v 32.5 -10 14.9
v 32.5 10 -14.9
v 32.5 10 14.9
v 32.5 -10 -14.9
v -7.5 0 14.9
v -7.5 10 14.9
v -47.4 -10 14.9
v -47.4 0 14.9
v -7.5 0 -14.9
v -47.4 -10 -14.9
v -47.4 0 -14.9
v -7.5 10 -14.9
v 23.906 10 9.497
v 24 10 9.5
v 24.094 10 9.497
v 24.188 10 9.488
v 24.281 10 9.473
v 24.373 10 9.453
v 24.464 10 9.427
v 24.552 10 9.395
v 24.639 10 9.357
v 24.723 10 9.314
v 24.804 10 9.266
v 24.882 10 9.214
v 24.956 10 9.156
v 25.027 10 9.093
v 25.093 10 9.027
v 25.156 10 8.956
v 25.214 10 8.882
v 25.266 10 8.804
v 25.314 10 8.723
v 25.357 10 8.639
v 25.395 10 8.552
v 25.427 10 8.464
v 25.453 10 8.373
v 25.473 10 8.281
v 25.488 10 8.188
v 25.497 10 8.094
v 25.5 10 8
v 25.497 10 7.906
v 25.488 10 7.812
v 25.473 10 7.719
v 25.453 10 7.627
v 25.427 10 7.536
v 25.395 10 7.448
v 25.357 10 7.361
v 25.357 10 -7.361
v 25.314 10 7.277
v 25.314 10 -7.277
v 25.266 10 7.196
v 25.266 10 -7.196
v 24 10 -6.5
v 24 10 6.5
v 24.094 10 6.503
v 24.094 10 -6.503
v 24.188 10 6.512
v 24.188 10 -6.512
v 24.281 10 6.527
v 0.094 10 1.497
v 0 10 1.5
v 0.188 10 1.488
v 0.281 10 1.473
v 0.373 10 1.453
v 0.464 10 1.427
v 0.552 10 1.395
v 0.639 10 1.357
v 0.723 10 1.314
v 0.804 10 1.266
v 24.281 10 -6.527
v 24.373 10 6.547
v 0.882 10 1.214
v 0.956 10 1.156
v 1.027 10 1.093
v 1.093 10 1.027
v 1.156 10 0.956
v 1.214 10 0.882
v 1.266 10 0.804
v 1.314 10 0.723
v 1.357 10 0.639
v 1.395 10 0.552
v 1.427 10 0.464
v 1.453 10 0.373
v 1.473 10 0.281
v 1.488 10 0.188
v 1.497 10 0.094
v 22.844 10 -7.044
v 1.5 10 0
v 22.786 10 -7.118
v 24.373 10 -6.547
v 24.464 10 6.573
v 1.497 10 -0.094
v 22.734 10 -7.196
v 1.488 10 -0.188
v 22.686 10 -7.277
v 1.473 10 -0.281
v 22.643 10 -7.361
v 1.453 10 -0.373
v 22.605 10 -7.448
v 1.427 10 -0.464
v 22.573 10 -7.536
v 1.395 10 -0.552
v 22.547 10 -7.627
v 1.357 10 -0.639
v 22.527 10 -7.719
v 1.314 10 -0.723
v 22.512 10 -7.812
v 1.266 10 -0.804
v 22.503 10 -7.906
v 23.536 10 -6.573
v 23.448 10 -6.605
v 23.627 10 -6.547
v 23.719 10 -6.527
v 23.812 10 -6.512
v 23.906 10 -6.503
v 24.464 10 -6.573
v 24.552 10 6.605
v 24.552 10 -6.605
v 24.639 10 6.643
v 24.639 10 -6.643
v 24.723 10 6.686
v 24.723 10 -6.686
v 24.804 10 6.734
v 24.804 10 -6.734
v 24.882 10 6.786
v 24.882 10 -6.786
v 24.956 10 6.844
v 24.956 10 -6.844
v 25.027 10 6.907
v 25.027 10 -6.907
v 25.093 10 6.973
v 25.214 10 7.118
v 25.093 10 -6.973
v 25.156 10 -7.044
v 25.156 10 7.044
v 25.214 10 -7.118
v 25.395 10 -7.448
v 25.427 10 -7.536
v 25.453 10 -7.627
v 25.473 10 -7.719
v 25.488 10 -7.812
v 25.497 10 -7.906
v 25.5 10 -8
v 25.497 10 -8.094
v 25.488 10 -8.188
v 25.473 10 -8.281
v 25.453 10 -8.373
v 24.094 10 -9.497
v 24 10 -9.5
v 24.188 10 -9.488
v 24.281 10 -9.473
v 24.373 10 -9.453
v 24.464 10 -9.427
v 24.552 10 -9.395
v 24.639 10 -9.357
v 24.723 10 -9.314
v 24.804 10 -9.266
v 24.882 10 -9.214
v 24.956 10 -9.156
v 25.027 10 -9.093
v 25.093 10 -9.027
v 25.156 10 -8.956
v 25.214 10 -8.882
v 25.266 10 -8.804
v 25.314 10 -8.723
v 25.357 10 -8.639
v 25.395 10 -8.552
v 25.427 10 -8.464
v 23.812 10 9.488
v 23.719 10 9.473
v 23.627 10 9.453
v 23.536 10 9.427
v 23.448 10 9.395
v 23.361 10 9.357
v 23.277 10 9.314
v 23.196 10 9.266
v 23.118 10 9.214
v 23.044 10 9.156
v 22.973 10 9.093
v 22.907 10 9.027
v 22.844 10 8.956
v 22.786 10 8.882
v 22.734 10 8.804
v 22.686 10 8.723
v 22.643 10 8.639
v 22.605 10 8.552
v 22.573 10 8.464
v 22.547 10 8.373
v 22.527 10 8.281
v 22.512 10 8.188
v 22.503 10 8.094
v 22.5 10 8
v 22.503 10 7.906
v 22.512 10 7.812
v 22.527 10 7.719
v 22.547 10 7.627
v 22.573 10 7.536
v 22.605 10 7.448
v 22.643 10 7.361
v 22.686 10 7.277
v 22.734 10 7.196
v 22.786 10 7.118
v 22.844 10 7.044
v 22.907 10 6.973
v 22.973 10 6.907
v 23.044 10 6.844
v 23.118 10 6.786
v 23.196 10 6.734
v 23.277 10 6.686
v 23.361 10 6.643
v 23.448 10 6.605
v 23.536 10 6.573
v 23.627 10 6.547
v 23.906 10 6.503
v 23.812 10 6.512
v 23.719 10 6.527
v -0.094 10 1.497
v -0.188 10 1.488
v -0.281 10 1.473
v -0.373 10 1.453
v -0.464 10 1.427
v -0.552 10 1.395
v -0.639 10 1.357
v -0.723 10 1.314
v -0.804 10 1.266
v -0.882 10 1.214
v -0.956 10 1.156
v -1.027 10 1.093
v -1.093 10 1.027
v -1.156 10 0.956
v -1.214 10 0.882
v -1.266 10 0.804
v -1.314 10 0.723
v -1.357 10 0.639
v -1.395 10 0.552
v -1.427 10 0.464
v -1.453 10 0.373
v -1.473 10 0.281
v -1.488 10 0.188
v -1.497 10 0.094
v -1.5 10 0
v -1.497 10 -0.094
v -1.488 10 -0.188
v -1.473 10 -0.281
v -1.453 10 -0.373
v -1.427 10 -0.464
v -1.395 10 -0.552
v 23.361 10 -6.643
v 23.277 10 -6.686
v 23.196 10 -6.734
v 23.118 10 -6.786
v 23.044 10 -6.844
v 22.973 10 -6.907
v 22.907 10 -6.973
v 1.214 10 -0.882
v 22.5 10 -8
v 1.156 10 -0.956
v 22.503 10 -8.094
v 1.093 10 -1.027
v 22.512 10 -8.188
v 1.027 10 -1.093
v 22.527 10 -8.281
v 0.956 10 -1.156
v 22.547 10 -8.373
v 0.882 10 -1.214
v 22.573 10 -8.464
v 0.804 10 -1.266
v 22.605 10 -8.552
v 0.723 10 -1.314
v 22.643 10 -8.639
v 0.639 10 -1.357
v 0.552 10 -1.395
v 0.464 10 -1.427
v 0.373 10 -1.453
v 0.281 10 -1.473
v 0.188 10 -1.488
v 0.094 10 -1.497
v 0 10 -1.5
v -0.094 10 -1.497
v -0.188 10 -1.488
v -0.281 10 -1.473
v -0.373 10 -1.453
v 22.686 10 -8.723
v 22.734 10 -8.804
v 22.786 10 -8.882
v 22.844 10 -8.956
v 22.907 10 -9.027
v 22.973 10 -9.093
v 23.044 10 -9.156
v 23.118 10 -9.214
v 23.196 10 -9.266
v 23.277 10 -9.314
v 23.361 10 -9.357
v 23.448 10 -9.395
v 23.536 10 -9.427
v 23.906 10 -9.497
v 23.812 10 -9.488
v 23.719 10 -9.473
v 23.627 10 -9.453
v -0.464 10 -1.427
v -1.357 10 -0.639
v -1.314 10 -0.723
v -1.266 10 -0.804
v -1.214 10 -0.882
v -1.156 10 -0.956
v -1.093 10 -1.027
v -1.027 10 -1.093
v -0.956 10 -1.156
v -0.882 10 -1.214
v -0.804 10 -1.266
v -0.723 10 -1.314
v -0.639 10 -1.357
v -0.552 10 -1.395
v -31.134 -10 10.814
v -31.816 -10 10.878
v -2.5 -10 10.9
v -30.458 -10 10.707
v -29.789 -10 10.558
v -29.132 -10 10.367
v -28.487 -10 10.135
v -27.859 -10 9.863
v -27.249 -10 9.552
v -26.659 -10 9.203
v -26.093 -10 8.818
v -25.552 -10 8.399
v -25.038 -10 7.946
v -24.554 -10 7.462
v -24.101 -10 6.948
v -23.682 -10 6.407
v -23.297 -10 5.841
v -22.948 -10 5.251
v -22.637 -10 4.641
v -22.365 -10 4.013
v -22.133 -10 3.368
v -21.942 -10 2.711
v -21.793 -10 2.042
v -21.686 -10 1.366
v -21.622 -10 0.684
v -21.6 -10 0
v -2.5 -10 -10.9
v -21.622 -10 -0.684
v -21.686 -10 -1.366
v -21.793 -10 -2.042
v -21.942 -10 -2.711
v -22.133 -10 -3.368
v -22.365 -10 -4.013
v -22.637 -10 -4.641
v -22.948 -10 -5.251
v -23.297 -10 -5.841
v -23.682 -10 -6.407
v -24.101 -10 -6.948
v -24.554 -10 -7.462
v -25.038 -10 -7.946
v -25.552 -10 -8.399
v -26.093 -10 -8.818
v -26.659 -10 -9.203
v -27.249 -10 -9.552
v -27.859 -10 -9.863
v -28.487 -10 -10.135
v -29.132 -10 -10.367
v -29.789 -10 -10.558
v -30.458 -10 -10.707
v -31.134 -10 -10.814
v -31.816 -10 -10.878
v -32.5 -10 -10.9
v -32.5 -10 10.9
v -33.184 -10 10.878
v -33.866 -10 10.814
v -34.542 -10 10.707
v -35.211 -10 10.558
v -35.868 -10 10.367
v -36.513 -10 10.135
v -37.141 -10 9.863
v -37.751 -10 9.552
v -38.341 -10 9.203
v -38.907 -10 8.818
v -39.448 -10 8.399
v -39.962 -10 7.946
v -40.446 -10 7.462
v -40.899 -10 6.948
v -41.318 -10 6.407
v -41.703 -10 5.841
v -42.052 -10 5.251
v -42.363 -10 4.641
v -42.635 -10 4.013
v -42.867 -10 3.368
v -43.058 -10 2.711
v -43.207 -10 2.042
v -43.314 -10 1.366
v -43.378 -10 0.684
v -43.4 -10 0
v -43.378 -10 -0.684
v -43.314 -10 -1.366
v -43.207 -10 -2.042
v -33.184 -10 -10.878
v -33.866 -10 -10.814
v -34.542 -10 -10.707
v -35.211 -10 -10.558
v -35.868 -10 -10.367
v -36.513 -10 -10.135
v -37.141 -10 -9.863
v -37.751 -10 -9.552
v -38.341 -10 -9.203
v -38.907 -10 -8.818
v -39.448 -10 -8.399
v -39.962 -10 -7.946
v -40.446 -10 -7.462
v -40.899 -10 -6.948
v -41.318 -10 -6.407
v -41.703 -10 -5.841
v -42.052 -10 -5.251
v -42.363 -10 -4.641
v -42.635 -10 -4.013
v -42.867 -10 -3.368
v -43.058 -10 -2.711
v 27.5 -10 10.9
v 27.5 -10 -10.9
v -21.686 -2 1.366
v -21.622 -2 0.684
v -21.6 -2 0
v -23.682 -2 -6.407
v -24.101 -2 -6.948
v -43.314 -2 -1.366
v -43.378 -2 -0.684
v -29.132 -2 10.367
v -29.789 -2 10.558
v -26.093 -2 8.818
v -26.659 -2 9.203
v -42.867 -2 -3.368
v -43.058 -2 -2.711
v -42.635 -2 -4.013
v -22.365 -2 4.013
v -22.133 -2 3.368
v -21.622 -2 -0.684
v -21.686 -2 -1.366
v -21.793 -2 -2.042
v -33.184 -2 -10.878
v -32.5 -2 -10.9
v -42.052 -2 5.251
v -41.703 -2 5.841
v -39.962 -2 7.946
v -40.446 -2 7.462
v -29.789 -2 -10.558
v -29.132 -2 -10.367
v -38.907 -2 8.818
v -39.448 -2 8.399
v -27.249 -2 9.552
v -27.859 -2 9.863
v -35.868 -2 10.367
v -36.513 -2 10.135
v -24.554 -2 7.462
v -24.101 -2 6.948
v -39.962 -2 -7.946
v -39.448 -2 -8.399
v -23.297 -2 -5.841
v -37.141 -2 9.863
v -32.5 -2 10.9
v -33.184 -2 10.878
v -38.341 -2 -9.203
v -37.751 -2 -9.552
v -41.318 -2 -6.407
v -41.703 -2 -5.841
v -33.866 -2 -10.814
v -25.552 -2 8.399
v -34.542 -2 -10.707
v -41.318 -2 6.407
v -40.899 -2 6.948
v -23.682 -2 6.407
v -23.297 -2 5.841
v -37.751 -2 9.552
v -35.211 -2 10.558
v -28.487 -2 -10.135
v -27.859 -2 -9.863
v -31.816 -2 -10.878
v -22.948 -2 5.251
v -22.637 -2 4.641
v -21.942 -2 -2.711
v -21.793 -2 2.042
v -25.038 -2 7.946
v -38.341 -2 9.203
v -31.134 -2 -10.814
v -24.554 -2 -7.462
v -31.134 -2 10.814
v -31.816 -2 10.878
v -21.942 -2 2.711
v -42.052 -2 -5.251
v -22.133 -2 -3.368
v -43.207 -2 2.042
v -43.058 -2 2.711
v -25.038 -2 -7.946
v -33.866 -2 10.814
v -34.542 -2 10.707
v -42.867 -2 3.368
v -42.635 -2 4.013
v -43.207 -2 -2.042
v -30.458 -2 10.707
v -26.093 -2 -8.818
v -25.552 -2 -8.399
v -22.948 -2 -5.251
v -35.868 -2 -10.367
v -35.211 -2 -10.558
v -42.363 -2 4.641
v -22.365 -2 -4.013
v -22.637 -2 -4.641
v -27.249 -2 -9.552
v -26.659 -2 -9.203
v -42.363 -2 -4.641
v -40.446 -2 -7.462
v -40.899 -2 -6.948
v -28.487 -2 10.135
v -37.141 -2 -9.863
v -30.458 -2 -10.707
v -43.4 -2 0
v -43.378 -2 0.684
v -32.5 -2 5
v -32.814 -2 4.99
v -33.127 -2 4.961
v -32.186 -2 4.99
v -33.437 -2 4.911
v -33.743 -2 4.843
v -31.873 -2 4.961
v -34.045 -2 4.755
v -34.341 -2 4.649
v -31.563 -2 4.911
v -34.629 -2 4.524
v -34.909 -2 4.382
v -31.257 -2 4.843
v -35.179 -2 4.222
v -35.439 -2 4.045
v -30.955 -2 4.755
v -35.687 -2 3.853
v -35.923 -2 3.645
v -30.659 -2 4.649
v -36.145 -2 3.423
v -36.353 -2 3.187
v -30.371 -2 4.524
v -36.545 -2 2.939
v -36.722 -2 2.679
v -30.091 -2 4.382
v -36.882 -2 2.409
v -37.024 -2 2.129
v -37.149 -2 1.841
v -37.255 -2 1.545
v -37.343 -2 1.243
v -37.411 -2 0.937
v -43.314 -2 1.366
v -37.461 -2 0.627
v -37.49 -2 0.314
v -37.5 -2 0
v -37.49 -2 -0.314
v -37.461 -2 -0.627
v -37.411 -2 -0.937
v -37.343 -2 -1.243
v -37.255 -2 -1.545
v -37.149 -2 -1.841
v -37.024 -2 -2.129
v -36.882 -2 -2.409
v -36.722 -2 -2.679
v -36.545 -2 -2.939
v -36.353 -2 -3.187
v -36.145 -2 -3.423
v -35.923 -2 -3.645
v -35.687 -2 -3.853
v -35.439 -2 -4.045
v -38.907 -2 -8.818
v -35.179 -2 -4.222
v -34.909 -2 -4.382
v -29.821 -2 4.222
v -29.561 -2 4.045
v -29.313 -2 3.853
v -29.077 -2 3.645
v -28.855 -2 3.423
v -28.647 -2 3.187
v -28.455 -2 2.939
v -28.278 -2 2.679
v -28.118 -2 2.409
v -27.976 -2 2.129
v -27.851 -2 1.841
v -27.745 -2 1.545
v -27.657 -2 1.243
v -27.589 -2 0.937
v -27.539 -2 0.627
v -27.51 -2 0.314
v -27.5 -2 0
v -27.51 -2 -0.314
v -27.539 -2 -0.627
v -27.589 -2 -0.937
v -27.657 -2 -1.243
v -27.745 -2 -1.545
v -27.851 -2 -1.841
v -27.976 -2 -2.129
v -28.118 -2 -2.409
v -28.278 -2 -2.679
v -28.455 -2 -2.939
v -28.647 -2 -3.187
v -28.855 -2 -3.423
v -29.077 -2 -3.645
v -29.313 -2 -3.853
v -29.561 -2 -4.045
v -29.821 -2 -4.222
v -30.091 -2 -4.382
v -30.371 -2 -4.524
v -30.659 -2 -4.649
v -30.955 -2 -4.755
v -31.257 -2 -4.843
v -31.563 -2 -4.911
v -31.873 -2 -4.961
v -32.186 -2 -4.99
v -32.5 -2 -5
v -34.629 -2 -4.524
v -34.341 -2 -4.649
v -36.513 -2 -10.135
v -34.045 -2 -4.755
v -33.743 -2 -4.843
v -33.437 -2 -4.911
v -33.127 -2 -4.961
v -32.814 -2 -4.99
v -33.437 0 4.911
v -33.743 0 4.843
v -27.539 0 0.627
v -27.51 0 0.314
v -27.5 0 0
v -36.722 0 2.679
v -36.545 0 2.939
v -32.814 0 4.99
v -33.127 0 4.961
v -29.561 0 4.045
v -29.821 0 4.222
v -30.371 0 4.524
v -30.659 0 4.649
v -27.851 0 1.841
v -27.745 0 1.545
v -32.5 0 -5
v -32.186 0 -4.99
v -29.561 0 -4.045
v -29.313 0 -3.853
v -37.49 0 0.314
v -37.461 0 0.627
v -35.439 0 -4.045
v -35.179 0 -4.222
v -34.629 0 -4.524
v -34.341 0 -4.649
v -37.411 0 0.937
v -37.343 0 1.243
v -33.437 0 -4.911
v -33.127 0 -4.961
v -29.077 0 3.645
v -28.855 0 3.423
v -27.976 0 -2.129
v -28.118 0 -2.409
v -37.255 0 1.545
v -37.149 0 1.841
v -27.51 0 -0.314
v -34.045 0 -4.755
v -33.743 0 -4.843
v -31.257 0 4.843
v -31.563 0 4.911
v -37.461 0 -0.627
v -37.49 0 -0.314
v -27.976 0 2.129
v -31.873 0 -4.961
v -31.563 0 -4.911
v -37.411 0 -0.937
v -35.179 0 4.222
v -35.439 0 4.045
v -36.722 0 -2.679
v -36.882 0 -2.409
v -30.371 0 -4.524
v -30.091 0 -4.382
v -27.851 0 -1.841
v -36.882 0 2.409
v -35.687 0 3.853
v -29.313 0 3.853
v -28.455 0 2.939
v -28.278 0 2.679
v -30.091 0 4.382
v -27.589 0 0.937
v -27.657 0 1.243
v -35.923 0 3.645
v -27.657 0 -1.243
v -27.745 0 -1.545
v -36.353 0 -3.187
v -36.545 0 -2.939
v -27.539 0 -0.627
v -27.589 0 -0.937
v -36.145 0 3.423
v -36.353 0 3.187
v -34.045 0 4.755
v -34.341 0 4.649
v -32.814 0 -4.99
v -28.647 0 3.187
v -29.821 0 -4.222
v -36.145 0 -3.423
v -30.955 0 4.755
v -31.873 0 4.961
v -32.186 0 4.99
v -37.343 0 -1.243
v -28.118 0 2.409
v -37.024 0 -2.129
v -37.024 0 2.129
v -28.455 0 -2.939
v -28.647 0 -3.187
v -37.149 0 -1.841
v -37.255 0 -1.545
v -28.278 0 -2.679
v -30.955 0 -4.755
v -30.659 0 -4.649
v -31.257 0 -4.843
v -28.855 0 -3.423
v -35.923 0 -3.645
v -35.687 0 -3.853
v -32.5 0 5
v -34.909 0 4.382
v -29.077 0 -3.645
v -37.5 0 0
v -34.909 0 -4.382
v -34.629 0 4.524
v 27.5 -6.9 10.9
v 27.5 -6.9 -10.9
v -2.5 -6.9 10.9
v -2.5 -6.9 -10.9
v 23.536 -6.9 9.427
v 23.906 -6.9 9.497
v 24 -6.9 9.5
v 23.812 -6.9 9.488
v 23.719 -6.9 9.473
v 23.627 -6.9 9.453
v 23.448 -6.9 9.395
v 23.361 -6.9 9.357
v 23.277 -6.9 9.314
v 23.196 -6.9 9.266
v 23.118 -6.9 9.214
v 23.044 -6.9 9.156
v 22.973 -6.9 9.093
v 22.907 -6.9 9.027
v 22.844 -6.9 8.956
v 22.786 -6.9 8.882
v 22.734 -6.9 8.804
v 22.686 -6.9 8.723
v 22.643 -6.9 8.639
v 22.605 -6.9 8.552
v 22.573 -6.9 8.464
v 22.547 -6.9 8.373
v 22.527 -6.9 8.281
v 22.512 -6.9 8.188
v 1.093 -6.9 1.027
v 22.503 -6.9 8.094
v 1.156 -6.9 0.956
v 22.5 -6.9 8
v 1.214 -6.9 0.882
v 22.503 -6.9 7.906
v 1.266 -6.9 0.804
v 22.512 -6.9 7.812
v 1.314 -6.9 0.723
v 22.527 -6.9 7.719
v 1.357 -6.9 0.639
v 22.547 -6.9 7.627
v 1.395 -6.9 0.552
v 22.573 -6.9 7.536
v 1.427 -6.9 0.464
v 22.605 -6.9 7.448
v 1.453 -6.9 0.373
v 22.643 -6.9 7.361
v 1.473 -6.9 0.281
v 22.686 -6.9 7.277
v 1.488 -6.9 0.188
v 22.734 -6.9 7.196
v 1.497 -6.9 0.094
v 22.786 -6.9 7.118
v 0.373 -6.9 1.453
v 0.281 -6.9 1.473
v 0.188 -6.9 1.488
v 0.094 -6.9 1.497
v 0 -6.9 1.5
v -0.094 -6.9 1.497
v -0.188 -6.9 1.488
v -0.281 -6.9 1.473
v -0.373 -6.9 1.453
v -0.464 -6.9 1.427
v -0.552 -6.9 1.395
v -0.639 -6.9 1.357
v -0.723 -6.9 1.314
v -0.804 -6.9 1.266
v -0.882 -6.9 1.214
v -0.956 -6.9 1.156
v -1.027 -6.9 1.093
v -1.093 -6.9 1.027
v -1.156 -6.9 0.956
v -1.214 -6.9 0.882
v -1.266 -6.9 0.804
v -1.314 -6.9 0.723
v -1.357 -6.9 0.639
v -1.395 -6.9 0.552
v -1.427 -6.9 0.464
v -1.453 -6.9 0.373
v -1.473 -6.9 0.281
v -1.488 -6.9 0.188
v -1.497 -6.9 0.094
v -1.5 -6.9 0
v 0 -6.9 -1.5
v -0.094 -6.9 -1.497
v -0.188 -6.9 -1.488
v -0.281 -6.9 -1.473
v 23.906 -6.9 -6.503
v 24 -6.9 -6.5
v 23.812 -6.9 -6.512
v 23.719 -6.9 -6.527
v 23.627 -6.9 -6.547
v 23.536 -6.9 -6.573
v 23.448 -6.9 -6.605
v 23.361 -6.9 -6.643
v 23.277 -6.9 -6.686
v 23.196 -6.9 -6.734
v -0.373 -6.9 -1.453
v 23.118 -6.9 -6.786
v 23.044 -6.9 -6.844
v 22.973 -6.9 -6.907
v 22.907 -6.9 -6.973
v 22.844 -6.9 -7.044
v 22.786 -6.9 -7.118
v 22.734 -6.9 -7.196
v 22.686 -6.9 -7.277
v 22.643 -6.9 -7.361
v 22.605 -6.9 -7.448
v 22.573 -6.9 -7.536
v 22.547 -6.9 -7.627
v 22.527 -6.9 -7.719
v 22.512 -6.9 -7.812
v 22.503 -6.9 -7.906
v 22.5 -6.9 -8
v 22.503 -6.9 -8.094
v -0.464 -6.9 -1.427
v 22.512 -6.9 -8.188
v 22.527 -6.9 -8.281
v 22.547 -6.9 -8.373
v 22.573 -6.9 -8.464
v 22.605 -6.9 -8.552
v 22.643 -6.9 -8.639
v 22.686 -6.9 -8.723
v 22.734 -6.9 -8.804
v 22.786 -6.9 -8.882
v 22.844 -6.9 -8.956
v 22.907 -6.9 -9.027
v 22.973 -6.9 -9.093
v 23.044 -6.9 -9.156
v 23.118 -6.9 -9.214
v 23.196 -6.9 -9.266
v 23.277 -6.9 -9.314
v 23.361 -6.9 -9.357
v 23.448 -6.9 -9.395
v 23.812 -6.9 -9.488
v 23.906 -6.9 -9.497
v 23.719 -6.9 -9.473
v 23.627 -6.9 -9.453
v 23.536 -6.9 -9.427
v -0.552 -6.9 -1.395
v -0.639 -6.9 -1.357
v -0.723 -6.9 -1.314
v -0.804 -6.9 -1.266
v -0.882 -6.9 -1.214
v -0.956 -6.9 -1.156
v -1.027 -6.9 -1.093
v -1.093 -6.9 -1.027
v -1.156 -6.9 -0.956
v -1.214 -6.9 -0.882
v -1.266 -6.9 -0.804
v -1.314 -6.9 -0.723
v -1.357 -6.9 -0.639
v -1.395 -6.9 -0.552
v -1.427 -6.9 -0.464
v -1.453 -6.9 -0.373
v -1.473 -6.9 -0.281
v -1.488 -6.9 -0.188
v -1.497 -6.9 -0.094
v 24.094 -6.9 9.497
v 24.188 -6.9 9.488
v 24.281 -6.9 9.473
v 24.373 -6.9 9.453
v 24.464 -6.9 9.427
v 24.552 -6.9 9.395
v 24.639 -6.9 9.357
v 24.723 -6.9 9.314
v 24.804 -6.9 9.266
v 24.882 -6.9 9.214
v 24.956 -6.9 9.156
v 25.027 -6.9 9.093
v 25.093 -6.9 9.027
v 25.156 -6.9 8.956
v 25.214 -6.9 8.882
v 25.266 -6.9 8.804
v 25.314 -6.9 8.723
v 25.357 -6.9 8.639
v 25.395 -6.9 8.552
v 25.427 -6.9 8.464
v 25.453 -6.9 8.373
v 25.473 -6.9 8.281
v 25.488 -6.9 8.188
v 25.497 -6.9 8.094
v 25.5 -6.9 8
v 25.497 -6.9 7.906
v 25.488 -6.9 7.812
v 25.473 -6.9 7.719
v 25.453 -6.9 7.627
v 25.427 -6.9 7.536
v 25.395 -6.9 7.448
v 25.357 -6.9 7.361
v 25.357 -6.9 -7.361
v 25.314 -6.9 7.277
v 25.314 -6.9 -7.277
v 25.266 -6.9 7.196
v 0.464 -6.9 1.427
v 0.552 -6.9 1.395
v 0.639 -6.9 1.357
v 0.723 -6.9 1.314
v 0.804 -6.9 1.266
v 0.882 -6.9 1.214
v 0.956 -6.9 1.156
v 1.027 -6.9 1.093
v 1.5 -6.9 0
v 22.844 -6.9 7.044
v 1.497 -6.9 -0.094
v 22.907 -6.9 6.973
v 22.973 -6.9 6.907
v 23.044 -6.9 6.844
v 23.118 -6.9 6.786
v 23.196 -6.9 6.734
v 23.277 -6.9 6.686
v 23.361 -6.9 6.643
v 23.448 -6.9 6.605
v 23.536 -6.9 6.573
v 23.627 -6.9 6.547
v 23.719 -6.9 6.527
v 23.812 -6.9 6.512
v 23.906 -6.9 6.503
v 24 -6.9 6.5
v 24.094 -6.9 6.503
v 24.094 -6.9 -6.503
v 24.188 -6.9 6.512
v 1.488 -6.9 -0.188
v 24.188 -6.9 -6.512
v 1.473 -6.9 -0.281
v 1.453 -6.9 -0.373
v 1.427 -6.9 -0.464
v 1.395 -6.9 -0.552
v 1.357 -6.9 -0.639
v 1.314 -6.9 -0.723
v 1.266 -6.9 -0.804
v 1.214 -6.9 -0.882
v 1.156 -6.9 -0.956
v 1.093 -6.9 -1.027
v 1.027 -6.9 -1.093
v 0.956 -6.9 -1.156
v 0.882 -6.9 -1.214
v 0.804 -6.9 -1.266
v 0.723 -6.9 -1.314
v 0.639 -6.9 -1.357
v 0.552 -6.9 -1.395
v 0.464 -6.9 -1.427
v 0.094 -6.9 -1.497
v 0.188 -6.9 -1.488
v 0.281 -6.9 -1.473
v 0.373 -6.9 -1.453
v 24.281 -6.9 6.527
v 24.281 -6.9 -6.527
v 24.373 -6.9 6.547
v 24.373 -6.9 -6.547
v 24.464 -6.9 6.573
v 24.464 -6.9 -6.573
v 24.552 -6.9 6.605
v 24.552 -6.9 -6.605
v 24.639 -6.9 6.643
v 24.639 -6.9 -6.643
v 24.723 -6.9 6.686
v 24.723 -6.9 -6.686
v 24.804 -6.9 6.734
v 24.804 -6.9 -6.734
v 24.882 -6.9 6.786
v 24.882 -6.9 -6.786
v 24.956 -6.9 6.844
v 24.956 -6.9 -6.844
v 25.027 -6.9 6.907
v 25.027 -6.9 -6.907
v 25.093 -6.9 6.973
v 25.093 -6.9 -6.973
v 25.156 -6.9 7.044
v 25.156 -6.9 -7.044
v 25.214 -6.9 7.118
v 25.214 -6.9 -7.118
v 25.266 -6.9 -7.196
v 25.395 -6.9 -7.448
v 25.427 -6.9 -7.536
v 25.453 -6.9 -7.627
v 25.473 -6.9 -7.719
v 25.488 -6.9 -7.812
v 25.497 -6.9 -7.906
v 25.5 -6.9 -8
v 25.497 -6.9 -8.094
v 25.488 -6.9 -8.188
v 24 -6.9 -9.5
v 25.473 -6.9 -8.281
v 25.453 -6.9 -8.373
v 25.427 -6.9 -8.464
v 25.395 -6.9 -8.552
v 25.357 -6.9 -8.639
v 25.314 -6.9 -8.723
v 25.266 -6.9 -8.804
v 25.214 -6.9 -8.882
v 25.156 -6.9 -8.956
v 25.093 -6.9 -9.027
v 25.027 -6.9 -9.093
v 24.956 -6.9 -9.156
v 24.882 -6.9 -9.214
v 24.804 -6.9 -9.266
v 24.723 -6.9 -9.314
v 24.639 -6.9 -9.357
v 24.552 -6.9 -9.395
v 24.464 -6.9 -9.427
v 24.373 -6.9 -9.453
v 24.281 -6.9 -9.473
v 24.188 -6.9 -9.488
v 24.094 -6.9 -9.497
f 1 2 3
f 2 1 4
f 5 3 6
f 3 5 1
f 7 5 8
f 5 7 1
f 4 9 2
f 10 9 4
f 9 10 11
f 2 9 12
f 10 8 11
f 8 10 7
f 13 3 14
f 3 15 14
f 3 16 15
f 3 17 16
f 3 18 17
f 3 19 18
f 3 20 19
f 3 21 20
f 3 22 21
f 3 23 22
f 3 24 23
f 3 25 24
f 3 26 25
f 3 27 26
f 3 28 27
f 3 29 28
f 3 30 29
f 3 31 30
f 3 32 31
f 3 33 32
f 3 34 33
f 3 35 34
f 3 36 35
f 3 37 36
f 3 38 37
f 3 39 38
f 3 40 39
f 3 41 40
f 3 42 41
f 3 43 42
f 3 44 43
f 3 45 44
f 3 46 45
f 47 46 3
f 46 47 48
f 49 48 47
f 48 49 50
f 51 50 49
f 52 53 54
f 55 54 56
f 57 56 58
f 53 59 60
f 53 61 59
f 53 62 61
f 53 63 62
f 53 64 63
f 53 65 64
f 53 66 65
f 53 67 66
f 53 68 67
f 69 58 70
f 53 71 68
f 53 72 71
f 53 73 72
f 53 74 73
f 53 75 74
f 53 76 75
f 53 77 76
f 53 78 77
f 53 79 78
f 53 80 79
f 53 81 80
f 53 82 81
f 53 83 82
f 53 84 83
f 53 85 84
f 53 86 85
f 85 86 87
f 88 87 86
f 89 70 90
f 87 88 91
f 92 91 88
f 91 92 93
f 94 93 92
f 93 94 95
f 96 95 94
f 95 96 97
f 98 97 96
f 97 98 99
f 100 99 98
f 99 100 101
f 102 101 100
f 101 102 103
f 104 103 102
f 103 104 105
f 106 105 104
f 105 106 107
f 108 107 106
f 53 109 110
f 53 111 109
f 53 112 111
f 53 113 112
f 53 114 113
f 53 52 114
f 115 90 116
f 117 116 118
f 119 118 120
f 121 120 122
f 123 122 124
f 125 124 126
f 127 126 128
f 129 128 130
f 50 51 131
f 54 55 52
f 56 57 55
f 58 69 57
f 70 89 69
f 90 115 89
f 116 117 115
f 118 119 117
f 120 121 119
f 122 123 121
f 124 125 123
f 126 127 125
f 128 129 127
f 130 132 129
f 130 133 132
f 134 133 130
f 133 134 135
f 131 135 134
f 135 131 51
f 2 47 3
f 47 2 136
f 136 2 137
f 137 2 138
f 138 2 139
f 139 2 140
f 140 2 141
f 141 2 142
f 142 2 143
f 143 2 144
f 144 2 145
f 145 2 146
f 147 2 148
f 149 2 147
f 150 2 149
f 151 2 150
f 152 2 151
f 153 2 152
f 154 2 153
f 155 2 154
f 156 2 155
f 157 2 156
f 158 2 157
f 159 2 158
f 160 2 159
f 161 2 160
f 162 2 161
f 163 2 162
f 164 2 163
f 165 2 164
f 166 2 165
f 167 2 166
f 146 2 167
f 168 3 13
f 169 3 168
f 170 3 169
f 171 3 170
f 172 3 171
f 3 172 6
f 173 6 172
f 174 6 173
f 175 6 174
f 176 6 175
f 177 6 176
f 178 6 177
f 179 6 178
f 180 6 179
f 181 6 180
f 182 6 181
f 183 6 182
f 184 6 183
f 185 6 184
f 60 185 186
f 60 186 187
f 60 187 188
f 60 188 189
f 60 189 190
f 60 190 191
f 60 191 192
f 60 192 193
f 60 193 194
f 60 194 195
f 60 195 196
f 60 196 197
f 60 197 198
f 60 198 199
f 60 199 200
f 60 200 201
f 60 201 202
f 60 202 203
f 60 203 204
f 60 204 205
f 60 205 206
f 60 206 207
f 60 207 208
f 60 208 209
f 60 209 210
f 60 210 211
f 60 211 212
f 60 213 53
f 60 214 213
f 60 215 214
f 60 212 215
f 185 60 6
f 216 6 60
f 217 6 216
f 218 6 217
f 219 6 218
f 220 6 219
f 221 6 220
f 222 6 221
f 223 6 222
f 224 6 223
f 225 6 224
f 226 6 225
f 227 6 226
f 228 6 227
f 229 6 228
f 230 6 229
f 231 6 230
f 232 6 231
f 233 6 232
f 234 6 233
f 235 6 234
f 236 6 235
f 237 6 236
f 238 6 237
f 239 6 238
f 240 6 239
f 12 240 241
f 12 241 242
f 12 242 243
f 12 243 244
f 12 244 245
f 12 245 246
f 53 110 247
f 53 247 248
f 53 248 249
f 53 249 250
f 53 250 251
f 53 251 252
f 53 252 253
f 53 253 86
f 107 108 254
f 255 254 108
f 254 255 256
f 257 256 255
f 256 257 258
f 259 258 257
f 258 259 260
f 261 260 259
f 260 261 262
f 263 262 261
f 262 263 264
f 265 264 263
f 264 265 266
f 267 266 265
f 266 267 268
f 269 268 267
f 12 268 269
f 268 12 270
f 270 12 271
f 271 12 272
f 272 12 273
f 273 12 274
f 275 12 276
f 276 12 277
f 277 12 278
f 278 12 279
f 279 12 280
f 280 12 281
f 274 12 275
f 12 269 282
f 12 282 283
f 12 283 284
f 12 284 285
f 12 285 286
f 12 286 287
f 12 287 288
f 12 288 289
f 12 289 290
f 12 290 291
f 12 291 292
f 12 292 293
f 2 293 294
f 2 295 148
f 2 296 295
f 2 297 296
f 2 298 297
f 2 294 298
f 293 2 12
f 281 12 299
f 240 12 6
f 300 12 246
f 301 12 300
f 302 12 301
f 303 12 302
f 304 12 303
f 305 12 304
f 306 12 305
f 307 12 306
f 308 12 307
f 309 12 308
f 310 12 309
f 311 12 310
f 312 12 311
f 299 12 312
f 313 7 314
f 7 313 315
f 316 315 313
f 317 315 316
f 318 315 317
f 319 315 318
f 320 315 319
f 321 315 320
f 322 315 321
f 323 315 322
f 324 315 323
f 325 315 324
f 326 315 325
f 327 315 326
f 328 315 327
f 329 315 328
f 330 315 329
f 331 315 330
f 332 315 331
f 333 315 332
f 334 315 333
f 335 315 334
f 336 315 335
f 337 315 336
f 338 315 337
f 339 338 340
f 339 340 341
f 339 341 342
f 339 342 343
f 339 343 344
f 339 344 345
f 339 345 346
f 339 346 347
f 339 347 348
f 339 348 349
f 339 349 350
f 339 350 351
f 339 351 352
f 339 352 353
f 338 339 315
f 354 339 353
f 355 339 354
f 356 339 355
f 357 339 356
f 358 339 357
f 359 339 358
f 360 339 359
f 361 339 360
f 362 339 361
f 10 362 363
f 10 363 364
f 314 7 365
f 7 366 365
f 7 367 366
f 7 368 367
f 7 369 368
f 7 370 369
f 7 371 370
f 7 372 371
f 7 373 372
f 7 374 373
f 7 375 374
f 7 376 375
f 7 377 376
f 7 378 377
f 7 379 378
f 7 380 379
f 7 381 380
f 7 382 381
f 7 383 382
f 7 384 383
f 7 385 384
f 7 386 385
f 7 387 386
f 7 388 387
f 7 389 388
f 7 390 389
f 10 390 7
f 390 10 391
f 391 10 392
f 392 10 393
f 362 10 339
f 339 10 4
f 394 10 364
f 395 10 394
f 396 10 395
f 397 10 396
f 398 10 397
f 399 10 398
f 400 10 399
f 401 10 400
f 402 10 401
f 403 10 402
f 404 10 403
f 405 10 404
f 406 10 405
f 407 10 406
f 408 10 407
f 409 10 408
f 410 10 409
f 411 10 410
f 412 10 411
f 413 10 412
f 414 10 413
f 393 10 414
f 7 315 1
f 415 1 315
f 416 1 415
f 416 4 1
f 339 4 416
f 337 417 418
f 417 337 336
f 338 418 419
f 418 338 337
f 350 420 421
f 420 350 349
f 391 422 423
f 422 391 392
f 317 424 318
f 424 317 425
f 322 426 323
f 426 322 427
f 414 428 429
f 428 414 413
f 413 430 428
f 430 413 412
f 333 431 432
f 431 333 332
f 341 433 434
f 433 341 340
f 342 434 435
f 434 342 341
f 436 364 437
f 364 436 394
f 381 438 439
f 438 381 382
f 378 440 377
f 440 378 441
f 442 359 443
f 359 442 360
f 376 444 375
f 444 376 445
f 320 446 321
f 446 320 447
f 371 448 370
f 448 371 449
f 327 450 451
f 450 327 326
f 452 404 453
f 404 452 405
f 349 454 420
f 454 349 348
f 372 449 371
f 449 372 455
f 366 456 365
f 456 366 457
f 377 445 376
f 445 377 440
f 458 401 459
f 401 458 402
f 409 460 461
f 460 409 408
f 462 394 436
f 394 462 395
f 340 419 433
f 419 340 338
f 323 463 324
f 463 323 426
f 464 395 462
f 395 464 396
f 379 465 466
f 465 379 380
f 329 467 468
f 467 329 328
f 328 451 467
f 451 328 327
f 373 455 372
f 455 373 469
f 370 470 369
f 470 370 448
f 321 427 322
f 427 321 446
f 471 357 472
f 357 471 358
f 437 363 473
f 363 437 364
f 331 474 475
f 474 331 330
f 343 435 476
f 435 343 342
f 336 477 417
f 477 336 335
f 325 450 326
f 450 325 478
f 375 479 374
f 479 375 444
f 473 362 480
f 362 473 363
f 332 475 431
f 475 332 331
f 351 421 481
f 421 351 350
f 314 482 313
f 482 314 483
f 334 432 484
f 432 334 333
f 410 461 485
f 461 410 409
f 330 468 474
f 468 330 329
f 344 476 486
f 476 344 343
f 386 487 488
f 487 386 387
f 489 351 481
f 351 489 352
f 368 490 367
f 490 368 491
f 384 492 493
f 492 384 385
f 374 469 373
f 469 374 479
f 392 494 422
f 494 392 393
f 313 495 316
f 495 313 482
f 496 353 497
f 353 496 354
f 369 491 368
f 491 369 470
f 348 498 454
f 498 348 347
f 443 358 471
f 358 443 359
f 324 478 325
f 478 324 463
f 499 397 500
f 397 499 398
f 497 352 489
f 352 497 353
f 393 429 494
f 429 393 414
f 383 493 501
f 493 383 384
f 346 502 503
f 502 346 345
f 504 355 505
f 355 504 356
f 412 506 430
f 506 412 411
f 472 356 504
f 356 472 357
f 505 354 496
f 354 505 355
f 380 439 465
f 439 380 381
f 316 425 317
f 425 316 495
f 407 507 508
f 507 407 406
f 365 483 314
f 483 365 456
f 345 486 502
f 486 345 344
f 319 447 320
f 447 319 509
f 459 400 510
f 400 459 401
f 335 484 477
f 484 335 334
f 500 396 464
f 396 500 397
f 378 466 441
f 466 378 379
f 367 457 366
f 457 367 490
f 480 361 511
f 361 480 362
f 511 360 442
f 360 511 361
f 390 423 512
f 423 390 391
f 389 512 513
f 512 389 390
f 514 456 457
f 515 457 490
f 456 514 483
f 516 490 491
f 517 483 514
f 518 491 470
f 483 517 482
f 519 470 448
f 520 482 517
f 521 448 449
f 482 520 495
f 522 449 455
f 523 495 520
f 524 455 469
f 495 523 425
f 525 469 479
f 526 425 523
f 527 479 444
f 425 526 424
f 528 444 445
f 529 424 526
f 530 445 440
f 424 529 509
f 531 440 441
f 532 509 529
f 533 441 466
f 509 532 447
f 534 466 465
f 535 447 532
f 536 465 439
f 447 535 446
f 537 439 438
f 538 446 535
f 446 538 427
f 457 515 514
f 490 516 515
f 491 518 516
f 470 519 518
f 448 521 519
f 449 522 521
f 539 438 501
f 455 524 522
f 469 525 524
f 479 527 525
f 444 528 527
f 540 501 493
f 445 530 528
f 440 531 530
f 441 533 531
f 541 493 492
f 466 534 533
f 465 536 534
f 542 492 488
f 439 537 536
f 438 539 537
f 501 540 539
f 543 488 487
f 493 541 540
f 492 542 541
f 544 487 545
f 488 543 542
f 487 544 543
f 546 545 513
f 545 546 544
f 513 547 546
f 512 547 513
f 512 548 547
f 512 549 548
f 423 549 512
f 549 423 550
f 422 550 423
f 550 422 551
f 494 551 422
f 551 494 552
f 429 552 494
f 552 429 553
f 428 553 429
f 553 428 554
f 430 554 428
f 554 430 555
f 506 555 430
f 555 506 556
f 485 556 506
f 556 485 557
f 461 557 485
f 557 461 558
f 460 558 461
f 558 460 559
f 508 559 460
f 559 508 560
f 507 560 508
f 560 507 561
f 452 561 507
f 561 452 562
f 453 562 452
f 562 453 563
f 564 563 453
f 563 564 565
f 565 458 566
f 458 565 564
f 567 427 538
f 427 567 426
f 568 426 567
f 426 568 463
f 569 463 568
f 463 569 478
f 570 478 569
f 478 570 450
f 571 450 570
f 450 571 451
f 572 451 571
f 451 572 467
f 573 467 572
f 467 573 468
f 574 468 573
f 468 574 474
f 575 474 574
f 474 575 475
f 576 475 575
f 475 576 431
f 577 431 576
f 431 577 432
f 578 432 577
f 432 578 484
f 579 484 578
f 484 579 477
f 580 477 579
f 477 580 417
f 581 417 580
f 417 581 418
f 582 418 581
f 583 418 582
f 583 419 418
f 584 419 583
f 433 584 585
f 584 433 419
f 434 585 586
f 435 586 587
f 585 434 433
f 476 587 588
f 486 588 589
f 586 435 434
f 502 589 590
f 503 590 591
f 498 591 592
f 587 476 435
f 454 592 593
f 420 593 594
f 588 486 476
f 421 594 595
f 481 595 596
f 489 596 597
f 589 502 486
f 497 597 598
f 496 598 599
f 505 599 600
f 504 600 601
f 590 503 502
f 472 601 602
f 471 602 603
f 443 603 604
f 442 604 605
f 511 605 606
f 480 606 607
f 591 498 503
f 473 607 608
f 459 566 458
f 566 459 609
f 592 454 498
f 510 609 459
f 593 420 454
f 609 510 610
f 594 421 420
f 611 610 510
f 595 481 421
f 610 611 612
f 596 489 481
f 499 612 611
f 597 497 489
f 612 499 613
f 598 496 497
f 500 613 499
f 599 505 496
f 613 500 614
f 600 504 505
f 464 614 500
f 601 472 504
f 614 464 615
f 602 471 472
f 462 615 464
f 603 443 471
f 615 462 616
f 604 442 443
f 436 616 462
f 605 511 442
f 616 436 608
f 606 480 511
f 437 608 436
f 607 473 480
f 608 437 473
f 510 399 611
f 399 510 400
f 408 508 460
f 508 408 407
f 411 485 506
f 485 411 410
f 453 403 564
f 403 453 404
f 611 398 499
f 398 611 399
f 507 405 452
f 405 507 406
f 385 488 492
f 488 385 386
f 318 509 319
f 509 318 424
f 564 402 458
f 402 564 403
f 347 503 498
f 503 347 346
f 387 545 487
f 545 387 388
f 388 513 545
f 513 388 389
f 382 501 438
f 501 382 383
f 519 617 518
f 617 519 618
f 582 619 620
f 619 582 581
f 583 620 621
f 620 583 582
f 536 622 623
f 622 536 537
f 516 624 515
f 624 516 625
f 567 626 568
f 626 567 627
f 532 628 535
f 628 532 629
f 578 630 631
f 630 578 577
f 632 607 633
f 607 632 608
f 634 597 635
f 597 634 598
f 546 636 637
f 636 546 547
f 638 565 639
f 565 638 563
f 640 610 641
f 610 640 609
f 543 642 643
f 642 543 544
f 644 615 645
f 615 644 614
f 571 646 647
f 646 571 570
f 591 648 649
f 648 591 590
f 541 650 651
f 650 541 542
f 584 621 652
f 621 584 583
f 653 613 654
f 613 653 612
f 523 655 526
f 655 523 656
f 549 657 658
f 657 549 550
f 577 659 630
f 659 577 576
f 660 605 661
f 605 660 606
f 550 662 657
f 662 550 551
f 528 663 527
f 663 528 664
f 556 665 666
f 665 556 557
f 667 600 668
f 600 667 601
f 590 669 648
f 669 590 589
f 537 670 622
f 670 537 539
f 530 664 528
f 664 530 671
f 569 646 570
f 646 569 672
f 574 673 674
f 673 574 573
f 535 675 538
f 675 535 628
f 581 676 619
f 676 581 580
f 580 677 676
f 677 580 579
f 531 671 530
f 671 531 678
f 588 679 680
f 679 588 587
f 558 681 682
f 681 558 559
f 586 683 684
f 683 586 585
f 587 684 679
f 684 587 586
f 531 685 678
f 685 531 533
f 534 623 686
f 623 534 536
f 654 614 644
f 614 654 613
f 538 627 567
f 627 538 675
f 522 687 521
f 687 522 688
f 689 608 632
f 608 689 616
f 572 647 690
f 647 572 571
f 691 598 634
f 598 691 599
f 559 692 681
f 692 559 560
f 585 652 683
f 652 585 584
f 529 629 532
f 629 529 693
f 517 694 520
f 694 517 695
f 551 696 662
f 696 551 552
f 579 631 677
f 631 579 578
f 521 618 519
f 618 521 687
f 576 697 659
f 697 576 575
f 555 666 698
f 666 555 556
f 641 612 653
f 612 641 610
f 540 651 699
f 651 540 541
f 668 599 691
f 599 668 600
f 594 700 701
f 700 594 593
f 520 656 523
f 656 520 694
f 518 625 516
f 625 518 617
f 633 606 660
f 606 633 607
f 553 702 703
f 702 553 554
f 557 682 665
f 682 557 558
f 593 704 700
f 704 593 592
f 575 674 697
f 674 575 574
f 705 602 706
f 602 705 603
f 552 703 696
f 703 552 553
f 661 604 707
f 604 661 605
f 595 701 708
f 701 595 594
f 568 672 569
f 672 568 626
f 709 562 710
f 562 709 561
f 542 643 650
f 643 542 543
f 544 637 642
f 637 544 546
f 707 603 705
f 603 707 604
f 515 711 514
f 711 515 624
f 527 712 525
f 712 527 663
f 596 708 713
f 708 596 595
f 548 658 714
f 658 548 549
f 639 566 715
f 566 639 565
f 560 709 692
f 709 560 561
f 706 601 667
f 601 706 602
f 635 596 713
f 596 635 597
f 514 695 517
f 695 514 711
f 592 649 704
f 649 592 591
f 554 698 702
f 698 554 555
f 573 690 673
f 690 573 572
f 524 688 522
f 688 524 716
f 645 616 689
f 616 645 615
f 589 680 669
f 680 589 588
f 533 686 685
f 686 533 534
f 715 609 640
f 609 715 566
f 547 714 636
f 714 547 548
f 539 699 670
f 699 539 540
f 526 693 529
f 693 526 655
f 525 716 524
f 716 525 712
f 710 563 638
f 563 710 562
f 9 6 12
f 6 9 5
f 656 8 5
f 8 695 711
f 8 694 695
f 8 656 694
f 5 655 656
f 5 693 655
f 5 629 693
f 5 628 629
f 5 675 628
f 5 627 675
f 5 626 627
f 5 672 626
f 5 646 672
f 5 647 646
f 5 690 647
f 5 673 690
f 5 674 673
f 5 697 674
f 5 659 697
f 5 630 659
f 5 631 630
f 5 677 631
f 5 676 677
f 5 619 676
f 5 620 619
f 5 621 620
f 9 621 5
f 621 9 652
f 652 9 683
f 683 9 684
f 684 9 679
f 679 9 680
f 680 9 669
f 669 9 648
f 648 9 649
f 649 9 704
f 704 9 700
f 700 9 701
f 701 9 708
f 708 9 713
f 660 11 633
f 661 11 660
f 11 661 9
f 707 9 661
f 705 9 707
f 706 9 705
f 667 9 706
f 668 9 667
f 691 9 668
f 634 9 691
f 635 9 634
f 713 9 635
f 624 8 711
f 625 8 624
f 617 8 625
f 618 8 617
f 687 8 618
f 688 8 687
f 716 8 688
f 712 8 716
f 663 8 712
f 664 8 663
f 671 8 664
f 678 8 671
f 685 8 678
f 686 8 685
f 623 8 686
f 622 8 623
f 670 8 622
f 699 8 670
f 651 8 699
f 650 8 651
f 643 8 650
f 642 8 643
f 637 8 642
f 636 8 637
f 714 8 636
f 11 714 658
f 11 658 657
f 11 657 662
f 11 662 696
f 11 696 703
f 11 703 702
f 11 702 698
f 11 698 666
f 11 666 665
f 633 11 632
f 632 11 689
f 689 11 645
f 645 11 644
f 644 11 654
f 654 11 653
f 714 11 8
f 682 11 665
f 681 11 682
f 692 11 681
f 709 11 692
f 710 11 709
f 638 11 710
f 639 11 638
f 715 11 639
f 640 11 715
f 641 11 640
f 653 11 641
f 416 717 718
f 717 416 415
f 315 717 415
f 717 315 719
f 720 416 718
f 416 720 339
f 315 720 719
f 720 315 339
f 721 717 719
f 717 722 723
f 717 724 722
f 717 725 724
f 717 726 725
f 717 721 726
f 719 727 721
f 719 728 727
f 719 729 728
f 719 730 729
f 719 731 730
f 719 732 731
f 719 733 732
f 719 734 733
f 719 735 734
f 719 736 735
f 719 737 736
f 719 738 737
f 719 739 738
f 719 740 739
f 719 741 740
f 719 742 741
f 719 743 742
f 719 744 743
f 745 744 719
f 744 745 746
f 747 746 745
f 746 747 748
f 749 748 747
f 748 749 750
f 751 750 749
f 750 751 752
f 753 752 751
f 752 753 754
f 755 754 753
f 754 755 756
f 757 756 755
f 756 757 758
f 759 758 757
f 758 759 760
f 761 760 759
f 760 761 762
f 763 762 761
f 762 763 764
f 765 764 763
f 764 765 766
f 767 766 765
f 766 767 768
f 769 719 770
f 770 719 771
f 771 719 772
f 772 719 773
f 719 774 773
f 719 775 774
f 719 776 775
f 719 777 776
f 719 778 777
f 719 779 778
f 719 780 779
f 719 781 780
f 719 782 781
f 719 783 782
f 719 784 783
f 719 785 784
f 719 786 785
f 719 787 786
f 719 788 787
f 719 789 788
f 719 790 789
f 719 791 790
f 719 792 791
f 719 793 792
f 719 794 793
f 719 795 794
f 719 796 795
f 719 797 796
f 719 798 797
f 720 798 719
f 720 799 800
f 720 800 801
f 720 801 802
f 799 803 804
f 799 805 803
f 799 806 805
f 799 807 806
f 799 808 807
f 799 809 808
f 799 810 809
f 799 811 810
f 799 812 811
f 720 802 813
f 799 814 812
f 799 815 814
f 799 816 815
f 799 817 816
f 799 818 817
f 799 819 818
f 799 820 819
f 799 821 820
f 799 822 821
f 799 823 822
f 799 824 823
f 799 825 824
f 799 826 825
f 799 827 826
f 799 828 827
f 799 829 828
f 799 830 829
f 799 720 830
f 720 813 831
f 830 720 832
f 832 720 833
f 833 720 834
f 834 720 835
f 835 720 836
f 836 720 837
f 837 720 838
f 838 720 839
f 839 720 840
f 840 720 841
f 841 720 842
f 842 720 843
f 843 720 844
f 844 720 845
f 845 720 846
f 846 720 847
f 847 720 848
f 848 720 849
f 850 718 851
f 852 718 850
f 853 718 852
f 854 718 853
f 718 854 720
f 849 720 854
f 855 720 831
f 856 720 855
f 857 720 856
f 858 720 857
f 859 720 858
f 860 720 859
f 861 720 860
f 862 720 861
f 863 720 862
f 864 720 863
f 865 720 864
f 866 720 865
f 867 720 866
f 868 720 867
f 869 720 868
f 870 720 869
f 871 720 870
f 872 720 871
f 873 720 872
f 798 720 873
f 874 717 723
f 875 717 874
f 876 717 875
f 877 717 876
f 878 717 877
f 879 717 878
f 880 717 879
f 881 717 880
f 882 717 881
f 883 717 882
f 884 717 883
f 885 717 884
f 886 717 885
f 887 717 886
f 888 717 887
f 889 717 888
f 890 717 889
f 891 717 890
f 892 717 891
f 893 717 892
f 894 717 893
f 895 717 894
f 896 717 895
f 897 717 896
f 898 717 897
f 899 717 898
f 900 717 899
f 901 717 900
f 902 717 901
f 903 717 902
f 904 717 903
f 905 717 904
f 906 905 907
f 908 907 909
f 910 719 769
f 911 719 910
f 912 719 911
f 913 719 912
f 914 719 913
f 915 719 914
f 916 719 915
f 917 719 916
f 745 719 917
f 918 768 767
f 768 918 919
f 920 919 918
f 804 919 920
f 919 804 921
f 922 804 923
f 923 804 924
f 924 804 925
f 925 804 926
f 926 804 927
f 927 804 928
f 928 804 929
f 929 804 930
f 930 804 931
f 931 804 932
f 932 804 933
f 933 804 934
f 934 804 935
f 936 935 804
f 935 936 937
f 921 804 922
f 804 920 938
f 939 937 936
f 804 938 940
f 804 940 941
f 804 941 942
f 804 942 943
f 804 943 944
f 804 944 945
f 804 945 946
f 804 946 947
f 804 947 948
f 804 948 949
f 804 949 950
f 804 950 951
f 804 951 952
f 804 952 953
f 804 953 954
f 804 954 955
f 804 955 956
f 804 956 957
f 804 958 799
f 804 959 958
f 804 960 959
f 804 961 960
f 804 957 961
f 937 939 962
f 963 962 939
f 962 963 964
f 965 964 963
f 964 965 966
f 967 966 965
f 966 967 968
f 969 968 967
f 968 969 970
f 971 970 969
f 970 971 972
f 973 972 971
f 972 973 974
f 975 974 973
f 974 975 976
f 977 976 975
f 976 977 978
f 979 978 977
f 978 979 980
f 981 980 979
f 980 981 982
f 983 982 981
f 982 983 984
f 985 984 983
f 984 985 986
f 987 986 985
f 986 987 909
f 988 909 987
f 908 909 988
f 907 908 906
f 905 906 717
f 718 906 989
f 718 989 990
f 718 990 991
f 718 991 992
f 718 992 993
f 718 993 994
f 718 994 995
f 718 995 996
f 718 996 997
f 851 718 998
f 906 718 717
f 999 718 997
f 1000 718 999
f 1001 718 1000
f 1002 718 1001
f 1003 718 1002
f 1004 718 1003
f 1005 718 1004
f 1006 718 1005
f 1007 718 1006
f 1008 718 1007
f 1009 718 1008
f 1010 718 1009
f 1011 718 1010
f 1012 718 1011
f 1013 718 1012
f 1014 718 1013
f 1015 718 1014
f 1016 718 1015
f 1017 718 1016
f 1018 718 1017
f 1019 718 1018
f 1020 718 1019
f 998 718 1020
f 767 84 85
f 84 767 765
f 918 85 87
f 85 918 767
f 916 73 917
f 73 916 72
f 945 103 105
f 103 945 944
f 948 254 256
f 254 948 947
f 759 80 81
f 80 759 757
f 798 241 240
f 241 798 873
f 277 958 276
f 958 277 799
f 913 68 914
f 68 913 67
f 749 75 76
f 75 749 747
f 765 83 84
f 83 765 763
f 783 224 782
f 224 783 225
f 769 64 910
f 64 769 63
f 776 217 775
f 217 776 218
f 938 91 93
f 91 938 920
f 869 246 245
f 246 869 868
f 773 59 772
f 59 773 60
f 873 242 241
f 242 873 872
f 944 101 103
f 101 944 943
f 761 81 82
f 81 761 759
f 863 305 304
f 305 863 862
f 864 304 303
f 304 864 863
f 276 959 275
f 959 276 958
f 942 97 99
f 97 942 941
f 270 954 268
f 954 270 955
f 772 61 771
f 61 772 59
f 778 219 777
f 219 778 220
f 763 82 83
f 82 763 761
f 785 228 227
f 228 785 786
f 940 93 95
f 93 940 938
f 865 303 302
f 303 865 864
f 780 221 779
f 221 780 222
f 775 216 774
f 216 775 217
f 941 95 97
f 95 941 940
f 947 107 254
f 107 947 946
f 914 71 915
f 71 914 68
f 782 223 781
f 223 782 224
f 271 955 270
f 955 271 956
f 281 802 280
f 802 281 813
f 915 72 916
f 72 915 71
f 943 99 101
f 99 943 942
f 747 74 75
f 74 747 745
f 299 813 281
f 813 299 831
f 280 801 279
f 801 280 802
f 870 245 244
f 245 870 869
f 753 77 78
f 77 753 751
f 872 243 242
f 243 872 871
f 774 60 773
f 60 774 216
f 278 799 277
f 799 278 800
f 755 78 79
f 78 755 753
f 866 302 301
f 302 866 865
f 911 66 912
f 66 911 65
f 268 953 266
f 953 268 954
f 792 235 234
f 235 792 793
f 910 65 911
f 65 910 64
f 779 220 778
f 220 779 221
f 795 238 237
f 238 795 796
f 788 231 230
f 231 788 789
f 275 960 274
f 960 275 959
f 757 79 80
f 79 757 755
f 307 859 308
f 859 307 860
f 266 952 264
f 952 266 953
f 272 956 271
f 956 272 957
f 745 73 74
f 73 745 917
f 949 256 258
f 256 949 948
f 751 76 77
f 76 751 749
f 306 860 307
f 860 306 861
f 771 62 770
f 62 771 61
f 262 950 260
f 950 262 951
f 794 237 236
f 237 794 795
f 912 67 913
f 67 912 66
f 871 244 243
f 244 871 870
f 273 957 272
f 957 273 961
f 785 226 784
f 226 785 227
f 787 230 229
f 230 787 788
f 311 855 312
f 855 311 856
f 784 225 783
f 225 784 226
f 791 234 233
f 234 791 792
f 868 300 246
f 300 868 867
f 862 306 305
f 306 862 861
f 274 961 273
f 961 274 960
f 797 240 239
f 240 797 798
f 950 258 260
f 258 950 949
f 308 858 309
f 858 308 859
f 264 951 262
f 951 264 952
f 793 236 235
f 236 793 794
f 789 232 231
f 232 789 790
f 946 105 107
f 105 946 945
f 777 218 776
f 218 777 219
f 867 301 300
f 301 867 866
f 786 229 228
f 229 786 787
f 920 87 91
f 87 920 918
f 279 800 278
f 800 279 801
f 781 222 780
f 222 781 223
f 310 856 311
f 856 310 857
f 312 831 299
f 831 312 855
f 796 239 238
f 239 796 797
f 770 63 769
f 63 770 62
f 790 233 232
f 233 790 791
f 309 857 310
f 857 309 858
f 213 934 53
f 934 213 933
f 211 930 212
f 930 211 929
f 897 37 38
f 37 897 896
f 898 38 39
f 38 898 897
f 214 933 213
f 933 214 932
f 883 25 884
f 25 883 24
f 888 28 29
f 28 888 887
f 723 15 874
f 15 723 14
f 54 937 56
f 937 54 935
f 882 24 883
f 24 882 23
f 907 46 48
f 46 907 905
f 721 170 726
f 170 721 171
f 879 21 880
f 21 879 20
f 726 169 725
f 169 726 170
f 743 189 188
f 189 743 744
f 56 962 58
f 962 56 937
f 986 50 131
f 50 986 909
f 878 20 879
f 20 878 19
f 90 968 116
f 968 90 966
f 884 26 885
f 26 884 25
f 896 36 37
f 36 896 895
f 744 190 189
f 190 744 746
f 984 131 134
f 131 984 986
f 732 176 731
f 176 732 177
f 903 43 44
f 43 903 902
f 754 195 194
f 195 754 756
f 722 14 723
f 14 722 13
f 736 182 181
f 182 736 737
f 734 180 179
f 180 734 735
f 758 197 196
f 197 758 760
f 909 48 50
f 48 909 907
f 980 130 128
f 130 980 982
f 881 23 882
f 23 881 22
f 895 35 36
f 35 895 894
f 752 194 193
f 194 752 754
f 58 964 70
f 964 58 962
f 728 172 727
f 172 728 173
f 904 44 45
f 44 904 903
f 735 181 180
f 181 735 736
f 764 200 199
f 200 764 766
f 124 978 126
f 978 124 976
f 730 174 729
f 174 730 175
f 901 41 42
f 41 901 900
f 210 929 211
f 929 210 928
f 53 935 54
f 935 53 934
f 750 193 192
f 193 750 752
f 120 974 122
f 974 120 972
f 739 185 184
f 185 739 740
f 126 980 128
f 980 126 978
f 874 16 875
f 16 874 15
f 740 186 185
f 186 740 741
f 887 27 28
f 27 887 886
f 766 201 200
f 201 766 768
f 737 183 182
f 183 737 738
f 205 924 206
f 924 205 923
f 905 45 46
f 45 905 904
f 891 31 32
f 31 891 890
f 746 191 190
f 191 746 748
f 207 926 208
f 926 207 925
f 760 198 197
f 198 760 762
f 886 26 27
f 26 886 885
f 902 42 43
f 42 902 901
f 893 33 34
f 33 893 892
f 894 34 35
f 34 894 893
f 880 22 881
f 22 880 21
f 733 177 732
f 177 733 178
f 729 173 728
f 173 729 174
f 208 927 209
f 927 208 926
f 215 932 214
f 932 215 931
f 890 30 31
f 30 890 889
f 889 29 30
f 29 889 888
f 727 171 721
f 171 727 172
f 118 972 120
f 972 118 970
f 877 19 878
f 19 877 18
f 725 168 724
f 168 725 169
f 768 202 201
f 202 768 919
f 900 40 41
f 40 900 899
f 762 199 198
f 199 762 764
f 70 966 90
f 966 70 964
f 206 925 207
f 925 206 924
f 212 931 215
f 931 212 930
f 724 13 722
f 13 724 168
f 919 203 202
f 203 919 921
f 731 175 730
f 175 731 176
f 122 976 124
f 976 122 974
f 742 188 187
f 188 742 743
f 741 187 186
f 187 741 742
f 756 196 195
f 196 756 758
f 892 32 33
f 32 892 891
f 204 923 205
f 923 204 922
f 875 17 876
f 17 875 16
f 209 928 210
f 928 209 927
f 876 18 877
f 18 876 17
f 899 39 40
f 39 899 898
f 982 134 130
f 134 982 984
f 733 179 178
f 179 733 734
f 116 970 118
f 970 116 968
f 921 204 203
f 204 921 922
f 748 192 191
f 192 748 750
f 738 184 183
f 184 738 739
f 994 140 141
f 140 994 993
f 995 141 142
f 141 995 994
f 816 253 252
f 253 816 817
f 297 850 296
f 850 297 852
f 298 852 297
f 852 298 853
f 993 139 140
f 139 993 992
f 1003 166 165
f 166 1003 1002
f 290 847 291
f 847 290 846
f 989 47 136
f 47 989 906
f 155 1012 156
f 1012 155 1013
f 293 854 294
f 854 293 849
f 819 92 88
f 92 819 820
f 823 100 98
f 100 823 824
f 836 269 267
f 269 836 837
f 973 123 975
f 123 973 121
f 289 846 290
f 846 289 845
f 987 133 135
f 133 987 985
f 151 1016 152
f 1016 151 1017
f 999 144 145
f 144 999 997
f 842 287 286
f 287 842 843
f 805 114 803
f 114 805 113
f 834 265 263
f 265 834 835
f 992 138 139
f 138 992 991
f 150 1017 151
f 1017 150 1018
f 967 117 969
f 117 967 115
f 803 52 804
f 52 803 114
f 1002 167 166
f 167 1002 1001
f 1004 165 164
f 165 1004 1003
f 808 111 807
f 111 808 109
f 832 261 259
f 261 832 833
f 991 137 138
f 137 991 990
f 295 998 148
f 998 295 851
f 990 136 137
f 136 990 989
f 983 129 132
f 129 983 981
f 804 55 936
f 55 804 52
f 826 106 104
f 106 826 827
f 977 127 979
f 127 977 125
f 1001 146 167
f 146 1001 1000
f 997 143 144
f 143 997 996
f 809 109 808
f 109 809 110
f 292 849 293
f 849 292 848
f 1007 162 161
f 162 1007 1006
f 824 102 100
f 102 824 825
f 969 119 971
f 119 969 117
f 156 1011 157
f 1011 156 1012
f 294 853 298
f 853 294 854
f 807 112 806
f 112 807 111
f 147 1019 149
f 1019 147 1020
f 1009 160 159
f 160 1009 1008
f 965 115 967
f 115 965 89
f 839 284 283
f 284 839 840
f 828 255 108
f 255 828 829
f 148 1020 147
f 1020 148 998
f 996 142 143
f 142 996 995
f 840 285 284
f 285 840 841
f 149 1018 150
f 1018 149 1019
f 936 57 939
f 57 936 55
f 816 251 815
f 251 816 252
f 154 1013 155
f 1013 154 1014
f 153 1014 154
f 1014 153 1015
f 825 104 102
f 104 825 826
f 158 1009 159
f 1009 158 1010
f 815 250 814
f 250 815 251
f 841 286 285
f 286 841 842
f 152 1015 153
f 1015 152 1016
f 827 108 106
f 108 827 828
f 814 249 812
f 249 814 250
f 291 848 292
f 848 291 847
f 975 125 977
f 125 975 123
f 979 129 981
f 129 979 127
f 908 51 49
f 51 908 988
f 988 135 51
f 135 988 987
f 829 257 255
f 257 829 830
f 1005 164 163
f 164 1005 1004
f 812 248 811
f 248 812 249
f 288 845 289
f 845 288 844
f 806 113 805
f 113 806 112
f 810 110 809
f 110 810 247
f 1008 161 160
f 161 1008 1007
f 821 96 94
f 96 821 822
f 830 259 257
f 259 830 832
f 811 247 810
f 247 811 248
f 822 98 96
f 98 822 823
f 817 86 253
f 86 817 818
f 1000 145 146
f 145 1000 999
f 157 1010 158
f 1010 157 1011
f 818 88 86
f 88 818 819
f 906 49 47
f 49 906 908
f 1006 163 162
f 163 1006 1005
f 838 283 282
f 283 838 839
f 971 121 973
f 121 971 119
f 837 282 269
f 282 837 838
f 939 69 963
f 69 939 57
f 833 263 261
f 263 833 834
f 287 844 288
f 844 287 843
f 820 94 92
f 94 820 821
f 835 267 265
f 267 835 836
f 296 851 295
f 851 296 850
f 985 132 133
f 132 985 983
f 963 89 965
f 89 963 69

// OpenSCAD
$fn = 100;  // Nombre de facettes dans une révolution
d   = 21.8; // Diamètre du roulement
l   = 65;   // Distance centre axe - bord droit
h   = 20;   // Profondeur de la piece

hauteur = d+4*2;  // Hauteur de la pièce
vide = 22.4-6.5;  // Vide derrière le roulement

difference() {
    translate([-l/2-d/2-4,-h/2,-hauteur/2])  cube([l+d/2+4, h, hauteur]);

    // Trous pour le potentiomètre et son roulement
    translate([-l/2,-h/2+8,0]) rotate([90,0,0]) cylinder(r=d/2,h=8+1);
    translate([-l/2,-h/2+30,0]) rotate([90,0,0]) cylinder(r=5,h=60);

    // Vide derrière
    translate([-l/2-d/2-4-40,0,-hauteur/2-1]) cube([l+d/2+4, h/2+1, hauteur+2]);
    translate([l/2+5-40,-h/2-1,-(hauteur-8)/2]) cube([40-10,h-vide,hauteur-8]);

    // Trous pour les 3 vis
    translate([0,-h/2+30,0]) rotate([90,0,0]) cylinder(r=3/2,h=60);
    translate([24,-h/2+30,+8]) rotate([90,0,0]) cylinder(r=3/2,h=60);
    translate([24,-h/2+30,-8]) rotate([90,0,0]) cylinder(r=3/2,h=60);
}
